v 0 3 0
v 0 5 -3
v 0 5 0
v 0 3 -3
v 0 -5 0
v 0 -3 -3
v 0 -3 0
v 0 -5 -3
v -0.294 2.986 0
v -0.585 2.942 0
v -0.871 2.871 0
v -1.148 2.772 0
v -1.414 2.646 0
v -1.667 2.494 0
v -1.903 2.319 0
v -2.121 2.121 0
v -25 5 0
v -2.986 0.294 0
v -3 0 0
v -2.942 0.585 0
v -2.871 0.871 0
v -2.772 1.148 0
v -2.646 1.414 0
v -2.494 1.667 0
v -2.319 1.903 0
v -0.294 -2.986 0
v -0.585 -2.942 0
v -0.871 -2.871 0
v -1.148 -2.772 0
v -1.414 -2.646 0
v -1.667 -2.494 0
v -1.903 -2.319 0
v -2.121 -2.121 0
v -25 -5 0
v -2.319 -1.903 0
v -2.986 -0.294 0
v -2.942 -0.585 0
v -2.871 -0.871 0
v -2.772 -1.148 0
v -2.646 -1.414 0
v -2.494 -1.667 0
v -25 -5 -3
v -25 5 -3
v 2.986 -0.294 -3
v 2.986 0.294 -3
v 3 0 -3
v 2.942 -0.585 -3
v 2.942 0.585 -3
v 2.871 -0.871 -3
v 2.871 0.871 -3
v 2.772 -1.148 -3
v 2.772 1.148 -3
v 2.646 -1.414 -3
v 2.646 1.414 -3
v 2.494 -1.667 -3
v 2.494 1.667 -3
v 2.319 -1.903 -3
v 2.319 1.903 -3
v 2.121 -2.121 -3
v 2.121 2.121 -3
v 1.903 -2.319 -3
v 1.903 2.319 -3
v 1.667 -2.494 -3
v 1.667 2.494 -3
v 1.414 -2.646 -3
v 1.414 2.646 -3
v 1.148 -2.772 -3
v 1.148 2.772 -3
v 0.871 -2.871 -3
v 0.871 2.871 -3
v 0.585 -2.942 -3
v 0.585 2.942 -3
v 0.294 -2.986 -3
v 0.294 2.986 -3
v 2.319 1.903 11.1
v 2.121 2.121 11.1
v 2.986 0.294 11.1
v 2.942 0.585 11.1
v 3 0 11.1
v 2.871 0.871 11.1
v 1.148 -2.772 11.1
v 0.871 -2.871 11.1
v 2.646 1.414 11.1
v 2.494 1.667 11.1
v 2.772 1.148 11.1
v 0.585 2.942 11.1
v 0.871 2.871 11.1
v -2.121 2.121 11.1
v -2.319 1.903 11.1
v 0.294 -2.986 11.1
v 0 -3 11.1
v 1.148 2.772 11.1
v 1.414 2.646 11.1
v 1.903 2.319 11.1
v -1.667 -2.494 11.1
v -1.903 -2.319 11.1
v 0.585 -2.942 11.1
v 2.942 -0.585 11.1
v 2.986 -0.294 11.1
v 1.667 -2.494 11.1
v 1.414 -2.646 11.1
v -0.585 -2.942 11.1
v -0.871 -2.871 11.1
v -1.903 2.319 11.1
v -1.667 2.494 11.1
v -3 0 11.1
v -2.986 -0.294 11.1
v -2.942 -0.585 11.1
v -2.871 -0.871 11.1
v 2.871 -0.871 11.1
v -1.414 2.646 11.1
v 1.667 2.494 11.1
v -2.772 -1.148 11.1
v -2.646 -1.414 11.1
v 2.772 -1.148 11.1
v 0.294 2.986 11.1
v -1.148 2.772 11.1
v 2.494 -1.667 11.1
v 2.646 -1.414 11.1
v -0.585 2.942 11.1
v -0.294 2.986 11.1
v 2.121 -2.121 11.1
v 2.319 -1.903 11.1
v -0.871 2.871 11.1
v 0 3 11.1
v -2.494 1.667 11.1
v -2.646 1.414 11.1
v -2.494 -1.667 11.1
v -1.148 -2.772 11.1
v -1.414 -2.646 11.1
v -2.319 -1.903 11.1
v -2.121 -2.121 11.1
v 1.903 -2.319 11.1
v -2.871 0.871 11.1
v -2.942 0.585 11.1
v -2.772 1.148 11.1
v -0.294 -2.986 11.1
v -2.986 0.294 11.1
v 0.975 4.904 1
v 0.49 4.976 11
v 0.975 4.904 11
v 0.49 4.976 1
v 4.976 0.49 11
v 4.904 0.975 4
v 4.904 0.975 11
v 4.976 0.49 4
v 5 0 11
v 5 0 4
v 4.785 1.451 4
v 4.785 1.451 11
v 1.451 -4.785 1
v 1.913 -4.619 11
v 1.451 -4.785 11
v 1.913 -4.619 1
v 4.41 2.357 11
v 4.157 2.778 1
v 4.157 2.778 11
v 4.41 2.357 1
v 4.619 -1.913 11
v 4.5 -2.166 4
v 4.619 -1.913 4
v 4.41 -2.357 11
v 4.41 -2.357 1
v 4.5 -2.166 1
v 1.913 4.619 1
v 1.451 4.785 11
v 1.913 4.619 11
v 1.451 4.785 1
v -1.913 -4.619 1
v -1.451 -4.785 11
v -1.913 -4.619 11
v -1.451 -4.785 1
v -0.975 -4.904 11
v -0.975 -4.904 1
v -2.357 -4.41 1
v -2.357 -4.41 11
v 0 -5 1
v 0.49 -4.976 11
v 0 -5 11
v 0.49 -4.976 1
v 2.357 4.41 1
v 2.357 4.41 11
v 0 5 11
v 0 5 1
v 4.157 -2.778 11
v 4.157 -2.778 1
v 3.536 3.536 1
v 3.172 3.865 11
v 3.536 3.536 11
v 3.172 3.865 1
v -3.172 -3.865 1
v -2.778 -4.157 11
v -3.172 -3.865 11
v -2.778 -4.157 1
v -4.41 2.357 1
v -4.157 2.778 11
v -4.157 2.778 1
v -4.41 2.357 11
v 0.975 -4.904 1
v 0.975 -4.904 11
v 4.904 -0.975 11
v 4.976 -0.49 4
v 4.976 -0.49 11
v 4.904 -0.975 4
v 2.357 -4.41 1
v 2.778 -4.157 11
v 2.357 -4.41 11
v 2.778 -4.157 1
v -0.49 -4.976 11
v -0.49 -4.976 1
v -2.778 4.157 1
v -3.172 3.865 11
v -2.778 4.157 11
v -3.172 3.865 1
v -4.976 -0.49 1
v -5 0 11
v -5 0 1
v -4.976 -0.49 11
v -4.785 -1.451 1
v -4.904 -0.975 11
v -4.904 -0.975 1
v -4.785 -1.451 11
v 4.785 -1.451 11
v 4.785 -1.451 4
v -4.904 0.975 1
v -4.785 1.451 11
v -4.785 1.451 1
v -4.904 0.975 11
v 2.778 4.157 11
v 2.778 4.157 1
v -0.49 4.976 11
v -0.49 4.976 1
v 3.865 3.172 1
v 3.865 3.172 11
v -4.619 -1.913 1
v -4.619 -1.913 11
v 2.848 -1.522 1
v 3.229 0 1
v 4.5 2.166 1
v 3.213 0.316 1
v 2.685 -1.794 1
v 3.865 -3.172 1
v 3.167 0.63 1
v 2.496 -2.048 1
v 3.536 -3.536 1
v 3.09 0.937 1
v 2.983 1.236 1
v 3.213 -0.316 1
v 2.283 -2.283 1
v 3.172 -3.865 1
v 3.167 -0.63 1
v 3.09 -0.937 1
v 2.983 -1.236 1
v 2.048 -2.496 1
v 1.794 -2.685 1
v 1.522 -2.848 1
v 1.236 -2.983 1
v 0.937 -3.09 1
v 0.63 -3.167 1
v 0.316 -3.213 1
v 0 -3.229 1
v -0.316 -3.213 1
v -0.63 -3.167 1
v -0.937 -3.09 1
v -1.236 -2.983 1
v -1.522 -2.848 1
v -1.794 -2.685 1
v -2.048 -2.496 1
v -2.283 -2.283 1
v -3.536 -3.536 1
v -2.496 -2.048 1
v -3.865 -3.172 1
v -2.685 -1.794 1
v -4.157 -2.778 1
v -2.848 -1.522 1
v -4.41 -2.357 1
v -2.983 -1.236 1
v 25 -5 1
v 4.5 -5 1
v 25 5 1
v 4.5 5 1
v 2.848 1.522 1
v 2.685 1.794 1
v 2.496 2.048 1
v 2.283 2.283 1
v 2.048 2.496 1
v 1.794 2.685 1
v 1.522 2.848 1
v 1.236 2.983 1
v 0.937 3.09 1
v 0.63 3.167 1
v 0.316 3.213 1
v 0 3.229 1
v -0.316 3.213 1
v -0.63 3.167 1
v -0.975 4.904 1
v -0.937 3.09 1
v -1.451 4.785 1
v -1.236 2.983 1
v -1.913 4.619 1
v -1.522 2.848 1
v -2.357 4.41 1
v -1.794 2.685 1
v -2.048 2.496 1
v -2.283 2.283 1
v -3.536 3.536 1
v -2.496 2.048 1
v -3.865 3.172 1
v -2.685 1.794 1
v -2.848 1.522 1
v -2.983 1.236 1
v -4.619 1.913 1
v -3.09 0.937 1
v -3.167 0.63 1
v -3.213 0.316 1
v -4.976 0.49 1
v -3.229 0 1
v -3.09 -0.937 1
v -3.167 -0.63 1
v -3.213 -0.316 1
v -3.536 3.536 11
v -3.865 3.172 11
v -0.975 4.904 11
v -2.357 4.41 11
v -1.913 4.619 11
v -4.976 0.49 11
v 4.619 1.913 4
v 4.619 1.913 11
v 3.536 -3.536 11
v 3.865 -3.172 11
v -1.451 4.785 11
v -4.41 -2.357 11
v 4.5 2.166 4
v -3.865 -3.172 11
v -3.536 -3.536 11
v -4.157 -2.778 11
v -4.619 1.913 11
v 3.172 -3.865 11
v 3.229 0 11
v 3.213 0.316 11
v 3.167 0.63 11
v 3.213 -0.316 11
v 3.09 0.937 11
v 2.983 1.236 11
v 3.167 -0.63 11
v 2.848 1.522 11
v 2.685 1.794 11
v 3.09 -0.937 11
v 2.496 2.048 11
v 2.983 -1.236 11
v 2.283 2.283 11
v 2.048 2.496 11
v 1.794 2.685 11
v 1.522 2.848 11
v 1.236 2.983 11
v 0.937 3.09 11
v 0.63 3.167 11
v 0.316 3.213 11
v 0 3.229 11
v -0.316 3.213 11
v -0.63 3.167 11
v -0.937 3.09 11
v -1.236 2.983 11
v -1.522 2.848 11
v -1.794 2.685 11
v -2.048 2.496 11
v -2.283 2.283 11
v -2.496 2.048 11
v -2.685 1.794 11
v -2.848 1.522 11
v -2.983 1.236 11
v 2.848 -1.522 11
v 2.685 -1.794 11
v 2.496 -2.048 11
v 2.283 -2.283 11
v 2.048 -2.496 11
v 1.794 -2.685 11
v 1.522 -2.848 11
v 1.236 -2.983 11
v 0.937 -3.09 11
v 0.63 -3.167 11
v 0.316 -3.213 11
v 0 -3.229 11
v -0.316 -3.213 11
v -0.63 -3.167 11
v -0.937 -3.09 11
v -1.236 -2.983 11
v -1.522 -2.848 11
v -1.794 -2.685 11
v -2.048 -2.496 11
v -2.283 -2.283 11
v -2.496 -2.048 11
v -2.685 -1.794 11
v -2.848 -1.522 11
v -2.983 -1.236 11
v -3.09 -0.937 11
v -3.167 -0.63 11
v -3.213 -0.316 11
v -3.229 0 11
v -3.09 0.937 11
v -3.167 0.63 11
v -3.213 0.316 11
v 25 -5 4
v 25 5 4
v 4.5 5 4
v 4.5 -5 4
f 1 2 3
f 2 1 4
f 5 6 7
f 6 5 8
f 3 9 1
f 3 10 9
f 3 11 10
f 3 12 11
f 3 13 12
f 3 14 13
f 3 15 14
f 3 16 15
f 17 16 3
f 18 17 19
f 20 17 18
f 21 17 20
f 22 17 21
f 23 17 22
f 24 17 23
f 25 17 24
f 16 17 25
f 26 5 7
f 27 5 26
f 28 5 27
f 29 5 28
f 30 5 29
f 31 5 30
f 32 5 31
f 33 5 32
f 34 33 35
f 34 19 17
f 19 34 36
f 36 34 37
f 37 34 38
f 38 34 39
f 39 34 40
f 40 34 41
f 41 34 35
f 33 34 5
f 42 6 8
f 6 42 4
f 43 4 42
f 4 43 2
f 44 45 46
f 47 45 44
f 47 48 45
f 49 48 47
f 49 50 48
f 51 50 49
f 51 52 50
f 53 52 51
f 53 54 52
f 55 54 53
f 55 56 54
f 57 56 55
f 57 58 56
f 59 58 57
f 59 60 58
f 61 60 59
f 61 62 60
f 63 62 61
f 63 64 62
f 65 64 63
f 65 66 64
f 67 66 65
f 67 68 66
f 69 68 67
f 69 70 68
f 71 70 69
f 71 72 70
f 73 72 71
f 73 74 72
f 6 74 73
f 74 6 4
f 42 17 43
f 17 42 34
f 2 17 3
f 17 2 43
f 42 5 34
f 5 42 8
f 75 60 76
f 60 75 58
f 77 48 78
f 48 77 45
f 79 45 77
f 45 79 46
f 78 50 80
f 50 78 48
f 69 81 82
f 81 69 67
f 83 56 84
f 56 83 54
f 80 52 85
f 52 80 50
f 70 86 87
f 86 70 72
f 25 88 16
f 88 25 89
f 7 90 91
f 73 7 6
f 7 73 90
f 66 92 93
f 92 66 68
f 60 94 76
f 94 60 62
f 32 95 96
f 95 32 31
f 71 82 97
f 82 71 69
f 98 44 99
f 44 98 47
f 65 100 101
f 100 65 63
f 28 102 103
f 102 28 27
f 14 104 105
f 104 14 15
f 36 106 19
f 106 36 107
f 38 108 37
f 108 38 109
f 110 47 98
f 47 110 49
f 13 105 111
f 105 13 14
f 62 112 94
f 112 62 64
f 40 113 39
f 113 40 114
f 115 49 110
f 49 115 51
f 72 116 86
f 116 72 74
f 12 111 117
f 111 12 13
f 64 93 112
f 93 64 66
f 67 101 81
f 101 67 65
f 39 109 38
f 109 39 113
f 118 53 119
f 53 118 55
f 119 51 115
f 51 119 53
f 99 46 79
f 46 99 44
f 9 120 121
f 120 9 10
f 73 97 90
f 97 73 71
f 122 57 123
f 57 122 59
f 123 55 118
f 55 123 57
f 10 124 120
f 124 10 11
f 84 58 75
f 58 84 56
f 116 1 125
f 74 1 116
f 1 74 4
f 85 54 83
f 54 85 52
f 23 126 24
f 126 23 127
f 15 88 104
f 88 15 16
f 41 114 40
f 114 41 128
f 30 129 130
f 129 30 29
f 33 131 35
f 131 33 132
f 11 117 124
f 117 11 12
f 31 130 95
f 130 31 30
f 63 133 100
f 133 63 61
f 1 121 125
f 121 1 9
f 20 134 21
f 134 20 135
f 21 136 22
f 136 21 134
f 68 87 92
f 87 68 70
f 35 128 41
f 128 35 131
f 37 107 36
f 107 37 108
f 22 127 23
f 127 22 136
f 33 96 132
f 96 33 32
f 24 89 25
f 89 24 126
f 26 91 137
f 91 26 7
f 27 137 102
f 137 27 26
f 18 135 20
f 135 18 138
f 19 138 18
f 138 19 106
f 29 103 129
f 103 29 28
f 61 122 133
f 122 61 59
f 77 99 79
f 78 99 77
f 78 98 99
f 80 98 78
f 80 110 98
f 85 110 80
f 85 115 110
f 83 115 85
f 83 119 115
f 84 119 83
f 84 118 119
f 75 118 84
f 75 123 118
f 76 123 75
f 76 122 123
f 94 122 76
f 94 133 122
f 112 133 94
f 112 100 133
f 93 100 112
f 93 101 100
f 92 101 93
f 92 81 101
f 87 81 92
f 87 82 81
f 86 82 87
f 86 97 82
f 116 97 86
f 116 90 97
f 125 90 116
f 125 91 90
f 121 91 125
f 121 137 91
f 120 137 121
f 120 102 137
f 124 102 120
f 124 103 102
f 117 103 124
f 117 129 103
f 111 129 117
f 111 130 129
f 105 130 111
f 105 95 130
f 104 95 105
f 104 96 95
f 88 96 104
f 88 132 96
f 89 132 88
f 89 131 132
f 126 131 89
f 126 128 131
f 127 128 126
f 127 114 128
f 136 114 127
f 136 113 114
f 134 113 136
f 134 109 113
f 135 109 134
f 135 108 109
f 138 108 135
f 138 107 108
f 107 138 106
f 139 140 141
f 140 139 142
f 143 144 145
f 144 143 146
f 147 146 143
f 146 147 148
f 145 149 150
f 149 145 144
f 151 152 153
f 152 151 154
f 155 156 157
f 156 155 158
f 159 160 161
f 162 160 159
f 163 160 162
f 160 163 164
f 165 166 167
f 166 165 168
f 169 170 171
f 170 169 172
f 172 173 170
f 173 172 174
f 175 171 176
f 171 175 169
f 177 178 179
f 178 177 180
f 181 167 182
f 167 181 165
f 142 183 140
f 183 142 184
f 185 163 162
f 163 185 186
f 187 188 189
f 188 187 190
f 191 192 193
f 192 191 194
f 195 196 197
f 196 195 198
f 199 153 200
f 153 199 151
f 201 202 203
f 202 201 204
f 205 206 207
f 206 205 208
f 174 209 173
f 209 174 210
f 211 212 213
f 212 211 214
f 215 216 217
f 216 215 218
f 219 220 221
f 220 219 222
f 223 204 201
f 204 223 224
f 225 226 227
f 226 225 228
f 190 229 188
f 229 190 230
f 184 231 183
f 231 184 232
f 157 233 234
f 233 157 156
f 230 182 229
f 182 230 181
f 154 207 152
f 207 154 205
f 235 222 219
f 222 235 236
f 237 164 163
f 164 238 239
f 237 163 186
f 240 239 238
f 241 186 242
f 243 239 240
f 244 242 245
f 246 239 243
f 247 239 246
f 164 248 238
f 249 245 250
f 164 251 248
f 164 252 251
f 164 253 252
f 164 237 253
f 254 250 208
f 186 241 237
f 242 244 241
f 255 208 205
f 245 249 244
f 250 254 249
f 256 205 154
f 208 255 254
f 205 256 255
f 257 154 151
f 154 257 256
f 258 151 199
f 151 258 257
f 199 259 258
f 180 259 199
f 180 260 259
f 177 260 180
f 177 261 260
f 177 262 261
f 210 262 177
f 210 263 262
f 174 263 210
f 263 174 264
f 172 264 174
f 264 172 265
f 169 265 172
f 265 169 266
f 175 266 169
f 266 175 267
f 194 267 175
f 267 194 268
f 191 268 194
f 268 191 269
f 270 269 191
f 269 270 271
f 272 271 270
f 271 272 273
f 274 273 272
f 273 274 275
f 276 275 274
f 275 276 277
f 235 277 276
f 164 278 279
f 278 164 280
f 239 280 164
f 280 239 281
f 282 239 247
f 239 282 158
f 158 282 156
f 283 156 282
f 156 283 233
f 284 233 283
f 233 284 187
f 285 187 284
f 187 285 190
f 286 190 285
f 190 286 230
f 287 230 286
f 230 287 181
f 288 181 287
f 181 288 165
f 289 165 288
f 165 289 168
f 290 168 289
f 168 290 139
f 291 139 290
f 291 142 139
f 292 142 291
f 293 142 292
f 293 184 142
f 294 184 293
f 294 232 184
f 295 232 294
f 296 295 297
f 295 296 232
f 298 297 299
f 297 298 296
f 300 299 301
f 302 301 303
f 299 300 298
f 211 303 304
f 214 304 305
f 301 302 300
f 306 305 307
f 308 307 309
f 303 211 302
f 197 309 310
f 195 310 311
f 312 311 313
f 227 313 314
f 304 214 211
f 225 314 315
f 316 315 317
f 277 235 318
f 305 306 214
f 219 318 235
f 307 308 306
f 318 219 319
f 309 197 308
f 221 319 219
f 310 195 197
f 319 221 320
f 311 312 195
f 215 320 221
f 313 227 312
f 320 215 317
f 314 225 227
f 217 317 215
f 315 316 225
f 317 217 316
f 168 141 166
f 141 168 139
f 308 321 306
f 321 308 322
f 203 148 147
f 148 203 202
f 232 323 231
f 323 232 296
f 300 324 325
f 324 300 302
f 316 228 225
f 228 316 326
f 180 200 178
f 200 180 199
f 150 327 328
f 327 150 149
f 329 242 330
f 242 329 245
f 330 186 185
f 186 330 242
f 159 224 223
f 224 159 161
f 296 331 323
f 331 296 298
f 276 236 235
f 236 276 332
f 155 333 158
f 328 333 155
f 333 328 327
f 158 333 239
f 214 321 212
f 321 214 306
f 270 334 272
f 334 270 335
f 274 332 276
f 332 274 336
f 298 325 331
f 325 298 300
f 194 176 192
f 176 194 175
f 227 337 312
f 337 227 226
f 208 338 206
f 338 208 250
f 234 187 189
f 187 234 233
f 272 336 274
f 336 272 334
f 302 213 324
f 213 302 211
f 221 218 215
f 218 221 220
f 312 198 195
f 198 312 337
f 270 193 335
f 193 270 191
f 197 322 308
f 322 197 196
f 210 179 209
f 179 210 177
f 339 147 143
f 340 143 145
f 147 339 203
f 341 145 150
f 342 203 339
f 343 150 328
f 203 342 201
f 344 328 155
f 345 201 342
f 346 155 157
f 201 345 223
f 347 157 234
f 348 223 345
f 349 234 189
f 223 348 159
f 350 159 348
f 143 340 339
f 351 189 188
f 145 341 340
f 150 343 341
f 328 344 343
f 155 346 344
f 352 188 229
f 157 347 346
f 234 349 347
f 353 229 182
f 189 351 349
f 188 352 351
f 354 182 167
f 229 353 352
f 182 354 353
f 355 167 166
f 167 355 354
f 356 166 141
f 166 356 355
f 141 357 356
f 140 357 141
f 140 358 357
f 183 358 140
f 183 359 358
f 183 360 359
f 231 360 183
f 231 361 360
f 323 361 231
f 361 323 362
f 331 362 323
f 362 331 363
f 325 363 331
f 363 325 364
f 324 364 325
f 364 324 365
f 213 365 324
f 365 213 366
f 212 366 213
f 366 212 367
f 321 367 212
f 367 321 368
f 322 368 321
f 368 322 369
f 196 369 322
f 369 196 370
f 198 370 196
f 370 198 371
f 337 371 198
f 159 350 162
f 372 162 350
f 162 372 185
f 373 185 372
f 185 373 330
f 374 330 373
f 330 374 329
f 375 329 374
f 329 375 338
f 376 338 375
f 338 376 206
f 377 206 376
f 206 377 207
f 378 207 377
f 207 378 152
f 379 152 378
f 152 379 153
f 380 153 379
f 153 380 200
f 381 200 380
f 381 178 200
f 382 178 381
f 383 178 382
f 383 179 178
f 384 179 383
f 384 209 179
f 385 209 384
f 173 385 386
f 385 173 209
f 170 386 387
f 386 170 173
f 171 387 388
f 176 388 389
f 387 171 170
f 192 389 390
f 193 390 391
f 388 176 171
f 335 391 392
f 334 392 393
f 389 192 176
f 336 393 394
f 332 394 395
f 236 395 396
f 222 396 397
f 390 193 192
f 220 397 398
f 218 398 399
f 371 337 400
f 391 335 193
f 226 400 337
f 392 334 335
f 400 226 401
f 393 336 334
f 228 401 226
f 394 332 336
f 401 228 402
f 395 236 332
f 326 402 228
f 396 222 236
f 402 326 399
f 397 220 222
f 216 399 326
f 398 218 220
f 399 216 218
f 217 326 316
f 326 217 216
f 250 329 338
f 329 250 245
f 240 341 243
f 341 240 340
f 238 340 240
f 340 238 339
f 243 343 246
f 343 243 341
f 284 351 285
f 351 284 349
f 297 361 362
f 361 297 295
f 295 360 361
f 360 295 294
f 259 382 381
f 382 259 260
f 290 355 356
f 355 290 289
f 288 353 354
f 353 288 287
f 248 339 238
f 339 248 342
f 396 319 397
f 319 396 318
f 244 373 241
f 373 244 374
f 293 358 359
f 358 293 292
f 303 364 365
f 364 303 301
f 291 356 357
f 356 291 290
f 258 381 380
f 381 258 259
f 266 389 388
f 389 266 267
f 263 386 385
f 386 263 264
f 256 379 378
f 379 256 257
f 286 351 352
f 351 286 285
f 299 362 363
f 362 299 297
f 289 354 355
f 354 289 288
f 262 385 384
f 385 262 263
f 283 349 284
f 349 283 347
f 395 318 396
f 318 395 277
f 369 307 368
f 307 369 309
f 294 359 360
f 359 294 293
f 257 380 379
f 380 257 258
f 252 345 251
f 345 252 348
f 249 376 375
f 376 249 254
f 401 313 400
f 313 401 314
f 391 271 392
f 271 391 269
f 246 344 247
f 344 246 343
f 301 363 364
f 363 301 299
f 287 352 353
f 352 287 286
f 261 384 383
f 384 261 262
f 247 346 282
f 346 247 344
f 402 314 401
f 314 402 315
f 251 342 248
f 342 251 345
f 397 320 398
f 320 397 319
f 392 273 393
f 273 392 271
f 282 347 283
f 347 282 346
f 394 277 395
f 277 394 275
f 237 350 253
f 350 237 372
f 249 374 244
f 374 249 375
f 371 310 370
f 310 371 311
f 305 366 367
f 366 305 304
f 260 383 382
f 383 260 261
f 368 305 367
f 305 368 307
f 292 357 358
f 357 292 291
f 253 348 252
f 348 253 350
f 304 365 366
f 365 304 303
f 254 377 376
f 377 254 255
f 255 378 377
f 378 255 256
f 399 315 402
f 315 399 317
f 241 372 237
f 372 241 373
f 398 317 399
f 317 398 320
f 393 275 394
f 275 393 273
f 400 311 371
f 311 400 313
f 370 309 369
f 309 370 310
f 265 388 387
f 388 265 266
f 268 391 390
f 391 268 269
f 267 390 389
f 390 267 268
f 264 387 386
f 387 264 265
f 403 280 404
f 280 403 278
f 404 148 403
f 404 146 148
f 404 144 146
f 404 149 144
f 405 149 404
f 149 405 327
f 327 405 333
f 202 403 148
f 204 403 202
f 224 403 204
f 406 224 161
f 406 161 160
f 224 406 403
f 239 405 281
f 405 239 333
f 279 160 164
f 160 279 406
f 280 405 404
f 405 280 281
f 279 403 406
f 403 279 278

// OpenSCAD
// Reference submission for hinge-60-wide.
// Bore inscribed diameter 6.45 mm against a 6 mm pin: 0.45 mm as-designed
// diametral clearance, inside the 0.40-0.55 band.
// Units: mm. Assembly axis: +Z through the origin.
agentscad_part = "all";
hinge_angle = 0;   // pose control: the benchmark re-renders the moving part at this angle
$fn = 64;

bore_d = 6.45 / cos(180 / $fn);

module fixed_leaf() {
  union() {
    translate([-25, -5, -3]) cube([25, 10, 3]);
    translate([0, 0, -3]) cylinder(h = 14.1, d = 6);
  }
}

module moving_leaf() {
  union() {
    difference() {
      translate([0, 0, 1]) cylinder(h = 10, d = 10);
      translate([0, 0, 0.9]) cylinder(h = 10.2, d = bore_d);
    }
    translate([4.5, -5, 1]) cube([20.5, 10, 3]);
  }
}

module generated_part() {
  if (agentscad_part == "all" || agentscad_part == "fixed") fixed_leaf();
  if (agentscad_part == "all" || agentscad_part == "moving") rotate([0, 0, hinge_angle]) moving_leaf();
}

generated_part();
